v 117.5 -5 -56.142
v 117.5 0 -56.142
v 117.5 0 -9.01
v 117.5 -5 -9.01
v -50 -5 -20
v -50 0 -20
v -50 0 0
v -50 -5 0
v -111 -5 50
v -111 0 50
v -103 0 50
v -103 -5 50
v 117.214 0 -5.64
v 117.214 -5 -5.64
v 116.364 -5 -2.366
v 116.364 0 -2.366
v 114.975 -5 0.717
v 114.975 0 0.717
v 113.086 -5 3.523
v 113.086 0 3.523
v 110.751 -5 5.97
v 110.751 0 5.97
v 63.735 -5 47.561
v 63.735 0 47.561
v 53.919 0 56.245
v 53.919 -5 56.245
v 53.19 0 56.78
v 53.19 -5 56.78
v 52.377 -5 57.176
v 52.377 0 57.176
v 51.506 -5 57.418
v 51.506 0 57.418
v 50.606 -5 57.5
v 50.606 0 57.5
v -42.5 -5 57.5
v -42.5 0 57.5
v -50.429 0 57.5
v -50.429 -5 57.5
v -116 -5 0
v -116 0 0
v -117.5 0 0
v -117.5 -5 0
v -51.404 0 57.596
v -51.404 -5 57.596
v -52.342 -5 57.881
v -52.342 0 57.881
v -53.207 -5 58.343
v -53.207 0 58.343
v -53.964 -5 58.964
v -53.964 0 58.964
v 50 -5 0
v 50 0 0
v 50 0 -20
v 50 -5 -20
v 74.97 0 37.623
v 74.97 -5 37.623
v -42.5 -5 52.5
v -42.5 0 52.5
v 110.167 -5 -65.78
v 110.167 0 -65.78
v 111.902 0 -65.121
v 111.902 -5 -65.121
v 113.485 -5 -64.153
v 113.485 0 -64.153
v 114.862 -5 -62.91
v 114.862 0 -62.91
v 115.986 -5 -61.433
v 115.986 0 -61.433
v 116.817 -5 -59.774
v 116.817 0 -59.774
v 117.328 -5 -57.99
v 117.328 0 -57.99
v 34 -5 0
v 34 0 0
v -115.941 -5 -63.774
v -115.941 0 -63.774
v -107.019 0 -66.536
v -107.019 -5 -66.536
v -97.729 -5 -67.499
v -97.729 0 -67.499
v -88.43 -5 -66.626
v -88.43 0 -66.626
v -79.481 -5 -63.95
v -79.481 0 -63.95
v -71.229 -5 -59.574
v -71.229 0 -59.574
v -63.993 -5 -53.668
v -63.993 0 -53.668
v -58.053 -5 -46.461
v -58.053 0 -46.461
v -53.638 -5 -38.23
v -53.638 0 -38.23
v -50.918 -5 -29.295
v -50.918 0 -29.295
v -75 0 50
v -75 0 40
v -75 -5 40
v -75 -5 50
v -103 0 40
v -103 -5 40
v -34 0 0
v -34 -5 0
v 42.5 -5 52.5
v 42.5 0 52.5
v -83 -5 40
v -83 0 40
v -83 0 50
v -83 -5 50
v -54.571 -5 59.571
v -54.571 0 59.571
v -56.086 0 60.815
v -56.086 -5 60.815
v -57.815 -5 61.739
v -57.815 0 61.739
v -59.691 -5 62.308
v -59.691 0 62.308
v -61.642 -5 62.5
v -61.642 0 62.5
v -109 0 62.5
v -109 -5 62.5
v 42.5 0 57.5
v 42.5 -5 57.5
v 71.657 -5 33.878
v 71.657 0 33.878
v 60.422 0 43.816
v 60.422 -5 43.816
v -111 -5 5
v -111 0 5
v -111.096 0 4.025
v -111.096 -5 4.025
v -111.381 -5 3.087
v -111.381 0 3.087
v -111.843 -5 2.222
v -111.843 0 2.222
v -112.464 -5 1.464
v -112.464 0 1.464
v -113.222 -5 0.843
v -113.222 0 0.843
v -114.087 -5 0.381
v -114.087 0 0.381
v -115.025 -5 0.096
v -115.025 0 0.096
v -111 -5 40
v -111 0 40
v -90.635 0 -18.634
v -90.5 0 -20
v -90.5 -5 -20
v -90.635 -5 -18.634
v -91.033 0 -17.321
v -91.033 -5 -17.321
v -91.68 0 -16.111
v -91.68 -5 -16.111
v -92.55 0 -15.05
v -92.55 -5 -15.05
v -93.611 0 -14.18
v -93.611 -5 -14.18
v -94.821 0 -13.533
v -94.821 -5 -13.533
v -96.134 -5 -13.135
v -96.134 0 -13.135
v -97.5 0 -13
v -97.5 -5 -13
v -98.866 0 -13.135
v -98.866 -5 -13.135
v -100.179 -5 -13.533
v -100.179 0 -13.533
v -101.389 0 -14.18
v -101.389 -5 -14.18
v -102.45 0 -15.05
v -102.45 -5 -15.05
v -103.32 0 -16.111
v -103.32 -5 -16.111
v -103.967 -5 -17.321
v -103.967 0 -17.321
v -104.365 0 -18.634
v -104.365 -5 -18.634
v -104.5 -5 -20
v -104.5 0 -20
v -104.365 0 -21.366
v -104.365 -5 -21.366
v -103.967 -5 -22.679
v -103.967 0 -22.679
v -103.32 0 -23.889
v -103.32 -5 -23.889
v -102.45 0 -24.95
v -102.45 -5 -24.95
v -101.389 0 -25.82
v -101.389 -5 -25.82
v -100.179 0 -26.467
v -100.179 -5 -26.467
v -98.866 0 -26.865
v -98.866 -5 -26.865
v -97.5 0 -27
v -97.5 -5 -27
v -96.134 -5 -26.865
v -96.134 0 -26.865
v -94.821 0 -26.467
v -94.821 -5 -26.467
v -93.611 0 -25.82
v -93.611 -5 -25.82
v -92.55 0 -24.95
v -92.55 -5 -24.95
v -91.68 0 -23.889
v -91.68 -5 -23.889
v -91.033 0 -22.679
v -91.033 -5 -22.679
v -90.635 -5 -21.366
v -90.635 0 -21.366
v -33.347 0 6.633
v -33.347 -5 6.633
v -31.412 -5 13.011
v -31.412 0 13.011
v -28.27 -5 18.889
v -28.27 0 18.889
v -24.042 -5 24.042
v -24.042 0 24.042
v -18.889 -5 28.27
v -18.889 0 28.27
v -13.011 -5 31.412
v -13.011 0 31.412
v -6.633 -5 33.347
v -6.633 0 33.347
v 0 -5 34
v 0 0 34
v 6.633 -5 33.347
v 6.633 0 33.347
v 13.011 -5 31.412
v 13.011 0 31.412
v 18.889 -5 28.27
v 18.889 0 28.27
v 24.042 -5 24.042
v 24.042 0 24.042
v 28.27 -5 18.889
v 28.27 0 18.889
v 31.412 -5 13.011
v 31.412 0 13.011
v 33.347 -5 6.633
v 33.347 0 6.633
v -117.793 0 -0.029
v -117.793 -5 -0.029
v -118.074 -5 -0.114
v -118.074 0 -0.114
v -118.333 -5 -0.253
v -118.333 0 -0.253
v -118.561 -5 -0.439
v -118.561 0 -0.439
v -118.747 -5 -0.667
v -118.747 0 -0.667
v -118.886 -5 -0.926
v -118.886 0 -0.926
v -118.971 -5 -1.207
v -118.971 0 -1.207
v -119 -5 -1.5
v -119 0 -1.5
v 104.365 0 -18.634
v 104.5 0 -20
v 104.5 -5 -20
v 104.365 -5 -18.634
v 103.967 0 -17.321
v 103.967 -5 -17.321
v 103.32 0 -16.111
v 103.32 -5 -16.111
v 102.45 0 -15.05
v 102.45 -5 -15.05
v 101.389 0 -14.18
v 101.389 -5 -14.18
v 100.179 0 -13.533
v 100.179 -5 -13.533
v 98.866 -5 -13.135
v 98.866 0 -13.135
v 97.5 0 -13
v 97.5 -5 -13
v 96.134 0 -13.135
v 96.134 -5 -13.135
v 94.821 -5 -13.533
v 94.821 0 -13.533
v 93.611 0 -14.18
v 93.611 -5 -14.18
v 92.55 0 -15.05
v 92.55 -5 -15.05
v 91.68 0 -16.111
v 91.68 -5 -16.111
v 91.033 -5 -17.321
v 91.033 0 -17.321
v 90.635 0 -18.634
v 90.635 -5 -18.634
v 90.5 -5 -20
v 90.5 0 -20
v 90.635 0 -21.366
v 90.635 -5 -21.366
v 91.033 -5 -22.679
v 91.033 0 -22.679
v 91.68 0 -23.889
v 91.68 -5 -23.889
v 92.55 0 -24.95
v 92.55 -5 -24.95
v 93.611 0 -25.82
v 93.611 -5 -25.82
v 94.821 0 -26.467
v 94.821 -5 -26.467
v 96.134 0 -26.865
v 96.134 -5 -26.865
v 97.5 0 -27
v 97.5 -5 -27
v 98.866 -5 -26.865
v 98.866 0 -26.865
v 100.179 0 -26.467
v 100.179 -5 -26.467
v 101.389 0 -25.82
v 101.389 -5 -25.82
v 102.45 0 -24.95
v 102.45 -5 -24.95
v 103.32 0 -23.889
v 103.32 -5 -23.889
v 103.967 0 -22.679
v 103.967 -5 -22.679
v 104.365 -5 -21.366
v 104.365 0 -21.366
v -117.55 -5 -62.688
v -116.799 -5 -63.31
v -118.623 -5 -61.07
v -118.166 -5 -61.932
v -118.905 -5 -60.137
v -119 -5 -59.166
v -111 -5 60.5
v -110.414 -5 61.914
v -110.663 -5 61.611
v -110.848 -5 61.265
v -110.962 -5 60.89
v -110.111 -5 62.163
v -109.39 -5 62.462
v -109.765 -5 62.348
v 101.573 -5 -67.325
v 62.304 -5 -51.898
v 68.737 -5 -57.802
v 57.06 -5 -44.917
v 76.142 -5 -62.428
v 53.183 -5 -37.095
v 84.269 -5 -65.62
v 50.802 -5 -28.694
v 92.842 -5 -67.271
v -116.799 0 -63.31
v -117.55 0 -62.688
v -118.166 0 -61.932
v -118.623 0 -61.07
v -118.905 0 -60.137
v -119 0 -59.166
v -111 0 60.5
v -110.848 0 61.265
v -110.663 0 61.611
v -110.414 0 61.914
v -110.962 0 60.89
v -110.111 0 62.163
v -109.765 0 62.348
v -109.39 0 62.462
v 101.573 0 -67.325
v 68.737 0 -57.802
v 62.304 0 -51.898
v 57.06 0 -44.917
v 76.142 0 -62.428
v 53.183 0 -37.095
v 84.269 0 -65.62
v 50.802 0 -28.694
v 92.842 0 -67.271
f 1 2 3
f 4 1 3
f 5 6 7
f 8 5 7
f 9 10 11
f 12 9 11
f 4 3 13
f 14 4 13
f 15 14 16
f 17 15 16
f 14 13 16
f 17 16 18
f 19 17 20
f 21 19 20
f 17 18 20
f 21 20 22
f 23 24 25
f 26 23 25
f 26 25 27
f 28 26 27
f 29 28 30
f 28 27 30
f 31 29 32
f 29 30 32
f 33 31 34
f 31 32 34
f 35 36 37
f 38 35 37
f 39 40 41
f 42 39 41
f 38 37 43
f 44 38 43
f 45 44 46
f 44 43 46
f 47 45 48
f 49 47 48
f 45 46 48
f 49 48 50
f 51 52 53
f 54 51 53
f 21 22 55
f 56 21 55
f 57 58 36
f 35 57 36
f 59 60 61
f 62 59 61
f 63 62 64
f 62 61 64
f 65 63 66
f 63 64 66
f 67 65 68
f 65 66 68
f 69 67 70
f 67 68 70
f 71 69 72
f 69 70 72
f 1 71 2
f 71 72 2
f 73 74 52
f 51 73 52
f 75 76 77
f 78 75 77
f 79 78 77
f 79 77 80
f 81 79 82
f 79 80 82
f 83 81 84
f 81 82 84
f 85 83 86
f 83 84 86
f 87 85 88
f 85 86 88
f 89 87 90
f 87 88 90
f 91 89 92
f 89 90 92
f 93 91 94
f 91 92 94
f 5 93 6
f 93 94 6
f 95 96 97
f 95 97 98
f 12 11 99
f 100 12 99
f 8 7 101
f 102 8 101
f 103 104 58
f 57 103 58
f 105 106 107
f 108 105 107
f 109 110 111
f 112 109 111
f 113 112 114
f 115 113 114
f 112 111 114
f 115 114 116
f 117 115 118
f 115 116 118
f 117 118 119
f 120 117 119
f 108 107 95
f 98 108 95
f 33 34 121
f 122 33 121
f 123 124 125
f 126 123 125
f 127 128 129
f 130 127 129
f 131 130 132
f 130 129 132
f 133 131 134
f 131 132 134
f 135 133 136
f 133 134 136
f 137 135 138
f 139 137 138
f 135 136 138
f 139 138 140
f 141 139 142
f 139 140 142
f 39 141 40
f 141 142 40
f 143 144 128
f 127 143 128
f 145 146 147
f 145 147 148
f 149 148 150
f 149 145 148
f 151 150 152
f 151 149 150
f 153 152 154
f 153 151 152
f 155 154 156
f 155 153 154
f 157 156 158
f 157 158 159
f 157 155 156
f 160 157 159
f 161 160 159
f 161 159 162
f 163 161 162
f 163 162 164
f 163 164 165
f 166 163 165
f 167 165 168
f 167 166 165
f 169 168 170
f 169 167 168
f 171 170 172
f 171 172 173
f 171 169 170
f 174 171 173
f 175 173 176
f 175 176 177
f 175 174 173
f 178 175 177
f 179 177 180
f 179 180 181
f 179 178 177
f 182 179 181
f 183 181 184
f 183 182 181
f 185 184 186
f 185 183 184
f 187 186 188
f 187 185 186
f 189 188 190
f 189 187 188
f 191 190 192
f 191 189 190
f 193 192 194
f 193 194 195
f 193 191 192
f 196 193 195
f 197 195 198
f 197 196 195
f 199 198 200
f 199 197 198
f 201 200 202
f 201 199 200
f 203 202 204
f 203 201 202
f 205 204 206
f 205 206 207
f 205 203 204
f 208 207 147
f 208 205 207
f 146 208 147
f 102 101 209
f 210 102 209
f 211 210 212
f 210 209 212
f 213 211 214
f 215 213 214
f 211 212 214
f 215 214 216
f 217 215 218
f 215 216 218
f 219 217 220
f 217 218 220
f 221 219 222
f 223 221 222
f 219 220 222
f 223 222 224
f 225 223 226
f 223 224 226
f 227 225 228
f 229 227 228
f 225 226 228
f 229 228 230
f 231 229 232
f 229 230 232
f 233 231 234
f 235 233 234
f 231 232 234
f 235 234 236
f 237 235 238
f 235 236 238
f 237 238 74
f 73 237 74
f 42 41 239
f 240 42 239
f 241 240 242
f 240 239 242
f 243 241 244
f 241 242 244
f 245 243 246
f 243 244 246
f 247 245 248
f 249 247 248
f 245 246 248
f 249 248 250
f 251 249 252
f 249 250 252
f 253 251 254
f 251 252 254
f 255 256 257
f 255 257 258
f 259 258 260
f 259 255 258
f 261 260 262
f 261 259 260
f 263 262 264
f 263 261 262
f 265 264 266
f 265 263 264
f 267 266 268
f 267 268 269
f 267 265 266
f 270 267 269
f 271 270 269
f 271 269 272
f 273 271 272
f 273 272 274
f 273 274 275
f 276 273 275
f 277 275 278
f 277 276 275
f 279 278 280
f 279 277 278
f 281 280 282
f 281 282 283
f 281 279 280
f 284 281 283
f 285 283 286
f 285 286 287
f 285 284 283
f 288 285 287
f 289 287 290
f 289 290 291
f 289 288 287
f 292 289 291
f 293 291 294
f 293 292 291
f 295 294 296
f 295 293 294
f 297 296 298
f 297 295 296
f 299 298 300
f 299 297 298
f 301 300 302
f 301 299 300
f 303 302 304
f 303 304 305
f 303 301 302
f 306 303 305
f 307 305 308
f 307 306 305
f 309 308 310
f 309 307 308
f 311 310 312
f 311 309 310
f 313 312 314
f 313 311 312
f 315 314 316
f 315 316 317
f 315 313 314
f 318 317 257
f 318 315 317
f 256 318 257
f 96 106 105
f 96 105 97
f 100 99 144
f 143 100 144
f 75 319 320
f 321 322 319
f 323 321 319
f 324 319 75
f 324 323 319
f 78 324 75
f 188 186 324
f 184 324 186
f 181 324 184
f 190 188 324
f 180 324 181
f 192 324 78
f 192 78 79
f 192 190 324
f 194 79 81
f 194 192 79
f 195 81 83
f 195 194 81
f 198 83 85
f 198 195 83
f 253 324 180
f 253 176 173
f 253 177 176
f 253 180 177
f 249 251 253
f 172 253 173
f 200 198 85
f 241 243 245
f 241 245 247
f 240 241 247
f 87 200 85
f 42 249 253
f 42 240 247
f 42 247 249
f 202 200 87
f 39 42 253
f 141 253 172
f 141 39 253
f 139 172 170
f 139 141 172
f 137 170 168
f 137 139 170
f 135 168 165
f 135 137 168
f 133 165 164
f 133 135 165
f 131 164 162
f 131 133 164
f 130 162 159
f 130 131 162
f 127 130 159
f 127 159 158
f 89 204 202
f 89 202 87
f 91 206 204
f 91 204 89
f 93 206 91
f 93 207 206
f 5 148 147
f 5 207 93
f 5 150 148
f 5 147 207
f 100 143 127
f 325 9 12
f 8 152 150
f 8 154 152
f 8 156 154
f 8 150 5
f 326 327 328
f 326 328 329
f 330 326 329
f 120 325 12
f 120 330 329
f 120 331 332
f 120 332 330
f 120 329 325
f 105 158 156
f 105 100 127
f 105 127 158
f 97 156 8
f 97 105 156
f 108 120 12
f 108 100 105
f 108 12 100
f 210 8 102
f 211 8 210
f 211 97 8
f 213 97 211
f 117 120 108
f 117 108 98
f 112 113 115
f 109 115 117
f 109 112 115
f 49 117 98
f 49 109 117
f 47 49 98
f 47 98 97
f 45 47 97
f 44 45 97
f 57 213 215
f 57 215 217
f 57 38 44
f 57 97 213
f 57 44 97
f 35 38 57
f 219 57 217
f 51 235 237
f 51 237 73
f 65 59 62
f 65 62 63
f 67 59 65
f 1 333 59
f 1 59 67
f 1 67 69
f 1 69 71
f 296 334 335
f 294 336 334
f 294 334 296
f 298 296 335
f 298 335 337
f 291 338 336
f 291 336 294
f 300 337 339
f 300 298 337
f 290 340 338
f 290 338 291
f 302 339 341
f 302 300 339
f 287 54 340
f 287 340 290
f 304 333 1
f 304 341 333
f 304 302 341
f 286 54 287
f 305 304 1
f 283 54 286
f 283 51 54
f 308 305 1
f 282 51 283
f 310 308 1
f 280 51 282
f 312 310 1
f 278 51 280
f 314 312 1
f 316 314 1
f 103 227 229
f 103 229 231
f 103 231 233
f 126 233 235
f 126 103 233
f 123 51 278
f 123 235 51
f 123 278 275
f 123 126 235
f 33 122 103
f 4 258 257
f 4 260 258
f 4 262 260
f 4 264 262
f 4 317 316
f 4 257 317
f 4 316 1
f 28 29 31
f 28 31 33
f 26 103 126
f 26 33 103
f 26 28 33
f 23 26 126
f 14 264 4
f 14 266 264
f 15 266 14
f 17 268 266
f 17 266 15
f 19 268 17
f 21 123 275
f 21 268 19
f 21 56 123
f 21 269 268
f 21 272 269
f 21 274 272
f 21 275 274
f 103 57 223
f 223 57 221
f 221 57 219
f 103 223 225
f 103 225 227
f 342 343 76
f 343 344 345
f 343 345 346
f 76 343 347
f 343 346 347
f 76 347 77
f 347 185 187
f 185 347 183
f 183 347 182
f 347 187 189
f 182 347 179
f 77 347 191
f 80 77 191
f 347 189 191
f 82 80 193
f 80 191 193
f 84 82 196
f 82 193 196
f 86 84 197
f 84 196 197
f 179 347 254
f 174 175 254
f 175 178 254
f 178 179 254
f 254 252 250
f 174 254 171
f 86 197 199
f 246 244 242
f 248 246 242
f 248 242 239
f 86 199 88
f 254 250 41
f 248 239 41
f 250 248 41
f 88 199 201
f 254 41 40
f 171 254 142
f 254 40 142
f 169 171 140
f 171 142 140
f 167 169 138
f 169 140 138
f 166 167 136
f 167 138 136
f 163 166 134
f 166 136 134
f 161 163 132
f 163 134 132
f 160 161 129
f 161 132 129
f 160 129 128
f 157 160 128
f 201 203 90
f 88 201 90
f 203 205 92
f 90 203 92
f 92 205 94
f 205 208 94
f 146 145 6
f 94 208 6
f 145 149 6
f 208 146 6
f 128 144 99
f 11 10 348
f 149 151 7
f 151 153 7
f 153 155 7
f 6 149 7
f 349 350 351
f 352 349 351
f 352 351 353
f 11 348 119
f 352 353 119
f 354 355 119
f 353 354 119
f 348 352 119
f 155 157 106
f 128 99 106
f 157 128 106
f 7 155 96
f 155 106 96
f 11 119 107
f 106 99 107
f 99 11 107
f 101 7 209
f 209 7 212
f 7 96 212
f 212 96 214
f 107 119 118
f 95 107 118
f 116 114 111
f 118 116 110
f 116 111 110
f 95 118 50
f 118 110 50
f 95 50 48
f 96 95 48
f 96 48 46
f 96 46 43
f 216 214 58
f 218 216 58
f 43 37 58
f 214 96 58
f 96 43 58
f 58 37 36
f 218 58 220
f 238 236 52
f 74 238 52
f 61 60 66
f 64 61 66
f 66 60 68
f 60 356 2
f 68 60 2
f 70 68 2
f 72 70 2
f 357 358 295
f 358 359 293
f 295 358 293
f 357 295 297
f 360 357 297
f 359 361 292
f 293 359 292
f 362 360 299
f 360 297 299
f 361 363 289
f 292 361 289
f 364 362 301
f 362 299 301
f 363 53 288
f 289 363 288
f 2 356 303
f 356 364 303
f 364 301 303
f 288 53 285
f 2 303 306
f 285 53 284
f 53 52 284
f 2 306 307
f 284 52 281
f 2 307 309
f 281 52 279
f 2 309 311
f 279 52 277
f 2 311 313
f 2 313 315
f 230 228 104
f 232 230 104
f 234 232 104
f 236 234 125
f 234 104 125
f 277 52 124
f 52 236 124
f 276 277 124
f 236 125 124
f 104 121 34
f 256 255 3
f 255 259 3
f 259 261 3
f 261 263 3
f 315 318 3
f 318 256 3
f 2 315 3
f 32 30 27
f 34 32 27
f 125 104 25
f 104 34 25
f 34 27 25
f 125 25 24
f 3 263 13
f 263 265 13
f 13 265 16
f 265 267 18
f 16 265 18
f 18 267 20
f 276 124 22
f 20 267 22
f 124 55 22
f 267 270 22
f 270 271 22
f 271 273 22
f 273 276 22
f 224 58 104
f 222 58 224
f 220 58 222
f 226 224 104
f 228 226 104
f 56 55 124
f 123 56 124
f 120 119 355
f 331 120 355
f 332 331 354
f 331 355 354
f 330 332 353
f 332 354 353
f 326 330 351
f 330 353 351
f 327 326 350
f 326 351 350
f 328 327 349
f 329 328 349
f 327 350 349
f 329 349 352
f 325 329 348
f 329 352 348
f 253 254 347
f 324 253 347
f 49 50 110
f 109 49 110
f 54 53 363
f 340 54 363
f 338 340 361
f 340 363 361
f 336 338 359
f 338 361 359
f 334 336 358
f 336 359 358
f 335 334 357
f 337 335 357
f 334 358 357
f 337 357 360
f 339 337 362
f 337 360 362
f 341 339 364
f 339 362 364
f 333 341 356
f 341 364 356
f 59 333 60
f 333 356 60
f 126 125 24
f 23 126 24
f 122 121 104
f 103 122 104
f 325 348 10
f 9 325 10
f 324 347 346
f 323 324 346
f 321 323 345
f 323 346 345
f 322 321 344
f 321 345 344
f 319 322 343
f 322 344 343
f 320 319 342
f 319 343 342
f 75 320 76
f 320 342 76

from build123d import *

# Parameters (mm, degrees)
F0_R     = 7
F0_W     = 8
F0_H     = 10
F1_DEPTH = 5


with BuildPart() as f1:
    # F0 (on Front) → F1 (new body)
    with BuildSketch(Plane.XZ):
        with BuildLine():
            ThreePointArc((-34, 0), (0, 34), (34, 0))
            Line((34, 0), (50, 0))
            Line((50, 0), (50, -20))
            ThreePointArc((50, -20), (68.737322, -57.801565), (110.166667, -65.779969))
            ThreePointArc((110.166667, -65.779969), (115.458224, -62.197381), (117.5, -56.142081))
            Line((117.5, -56.142081), (117.5, -9.010085))
            ThreePointArc((117.5, -9.010085), (115.734988, -0.795146), (110.751478, 5.969847))
            Line((110.751478, 5.969847), (74.969897, 37.622784))
            Line((74.969897, 37.622784), (71.657027, 33.877801))
            Line((71.657027, 33.877801), (60.422079, 43.816409))
            Line((60.422079, 43.816409), (63.734948, 47.561392))
            Line((63.734948, 47.561392), (53.918715, 56.244983))
            ThreePointArc((53.918715, 56.244983), (52.377157, 57.175731), (50.605846, 57.5))
            Line((50.605846, 57.5), (42.5, 57.5))
            Line((42.5, 57.5), (42.5, 52.5))
            Line((42.5, 52.5), (-42.5, 52.5))
            Line((-42.5, 52.5), (-42.5, 57.5))
            Line((-42.5, 57.5), (-50.428932, 57.5))
            ThreePointArc((-50.428932, 57.5), (-52.342349, 57.880602), (-53.964466, 58.964466))
            Line((-53.964466, 58.964466), (-54.571068, 59.571068))
            ThreePointArc((-54.571068, 59.571068), (-57.815301, 61.738795), (-61.642136, 62.5))
            Line((-61.642136, 62.5), (-109, 62.5))
            ThreePointArc((-109, 62.5), (-110.414214, 61.914214), (-111, 60.5))
            Line((-111, 60.5), (-111, 50))
            Line((-111, 50), (-103, 50))
            Line((-103, 50), (-103, 40))
            Line((-103, 40), (-111, 40))
            Line((-111, 40), (-111, 5))
            ThreePointArc((-111, 5), (-112.464466, 1.464466), (-116, 0))
            Line((-116, 0), (-117.5, 0))
            ThreePointArc((-117.5, 0), (-118.56066, -0.43934), (-119, -1.5))
            Line((-119, -1.5), (-119, -59.166312))
            ThreePointArc((-119, -59.166312), (-118.165686, -61.931644), (-115.941176, -63.774113))
            ThreePointArc((-115.941176, -63.774113), (-71.22935, -59.574019), (-50, -20))
            Line((-50, -20), (-50, 0))
            Line((-50, 0), (-34, 0))
        make_face()
        with Locations((-97.5, -20)):
            Circle(F0_R, mode=Mode.SUBTRACT)
        with Locations((97.5, -20)):
            Circle(F0_R, mode=Mode.SUBTRACT)
        with Locations((-79, 45)):
            Rectangle(F0_W, F0_H, mode=Mode.SUBTRACT)
    extrude(amount=F1_DEPTH)


solid = f1.part
